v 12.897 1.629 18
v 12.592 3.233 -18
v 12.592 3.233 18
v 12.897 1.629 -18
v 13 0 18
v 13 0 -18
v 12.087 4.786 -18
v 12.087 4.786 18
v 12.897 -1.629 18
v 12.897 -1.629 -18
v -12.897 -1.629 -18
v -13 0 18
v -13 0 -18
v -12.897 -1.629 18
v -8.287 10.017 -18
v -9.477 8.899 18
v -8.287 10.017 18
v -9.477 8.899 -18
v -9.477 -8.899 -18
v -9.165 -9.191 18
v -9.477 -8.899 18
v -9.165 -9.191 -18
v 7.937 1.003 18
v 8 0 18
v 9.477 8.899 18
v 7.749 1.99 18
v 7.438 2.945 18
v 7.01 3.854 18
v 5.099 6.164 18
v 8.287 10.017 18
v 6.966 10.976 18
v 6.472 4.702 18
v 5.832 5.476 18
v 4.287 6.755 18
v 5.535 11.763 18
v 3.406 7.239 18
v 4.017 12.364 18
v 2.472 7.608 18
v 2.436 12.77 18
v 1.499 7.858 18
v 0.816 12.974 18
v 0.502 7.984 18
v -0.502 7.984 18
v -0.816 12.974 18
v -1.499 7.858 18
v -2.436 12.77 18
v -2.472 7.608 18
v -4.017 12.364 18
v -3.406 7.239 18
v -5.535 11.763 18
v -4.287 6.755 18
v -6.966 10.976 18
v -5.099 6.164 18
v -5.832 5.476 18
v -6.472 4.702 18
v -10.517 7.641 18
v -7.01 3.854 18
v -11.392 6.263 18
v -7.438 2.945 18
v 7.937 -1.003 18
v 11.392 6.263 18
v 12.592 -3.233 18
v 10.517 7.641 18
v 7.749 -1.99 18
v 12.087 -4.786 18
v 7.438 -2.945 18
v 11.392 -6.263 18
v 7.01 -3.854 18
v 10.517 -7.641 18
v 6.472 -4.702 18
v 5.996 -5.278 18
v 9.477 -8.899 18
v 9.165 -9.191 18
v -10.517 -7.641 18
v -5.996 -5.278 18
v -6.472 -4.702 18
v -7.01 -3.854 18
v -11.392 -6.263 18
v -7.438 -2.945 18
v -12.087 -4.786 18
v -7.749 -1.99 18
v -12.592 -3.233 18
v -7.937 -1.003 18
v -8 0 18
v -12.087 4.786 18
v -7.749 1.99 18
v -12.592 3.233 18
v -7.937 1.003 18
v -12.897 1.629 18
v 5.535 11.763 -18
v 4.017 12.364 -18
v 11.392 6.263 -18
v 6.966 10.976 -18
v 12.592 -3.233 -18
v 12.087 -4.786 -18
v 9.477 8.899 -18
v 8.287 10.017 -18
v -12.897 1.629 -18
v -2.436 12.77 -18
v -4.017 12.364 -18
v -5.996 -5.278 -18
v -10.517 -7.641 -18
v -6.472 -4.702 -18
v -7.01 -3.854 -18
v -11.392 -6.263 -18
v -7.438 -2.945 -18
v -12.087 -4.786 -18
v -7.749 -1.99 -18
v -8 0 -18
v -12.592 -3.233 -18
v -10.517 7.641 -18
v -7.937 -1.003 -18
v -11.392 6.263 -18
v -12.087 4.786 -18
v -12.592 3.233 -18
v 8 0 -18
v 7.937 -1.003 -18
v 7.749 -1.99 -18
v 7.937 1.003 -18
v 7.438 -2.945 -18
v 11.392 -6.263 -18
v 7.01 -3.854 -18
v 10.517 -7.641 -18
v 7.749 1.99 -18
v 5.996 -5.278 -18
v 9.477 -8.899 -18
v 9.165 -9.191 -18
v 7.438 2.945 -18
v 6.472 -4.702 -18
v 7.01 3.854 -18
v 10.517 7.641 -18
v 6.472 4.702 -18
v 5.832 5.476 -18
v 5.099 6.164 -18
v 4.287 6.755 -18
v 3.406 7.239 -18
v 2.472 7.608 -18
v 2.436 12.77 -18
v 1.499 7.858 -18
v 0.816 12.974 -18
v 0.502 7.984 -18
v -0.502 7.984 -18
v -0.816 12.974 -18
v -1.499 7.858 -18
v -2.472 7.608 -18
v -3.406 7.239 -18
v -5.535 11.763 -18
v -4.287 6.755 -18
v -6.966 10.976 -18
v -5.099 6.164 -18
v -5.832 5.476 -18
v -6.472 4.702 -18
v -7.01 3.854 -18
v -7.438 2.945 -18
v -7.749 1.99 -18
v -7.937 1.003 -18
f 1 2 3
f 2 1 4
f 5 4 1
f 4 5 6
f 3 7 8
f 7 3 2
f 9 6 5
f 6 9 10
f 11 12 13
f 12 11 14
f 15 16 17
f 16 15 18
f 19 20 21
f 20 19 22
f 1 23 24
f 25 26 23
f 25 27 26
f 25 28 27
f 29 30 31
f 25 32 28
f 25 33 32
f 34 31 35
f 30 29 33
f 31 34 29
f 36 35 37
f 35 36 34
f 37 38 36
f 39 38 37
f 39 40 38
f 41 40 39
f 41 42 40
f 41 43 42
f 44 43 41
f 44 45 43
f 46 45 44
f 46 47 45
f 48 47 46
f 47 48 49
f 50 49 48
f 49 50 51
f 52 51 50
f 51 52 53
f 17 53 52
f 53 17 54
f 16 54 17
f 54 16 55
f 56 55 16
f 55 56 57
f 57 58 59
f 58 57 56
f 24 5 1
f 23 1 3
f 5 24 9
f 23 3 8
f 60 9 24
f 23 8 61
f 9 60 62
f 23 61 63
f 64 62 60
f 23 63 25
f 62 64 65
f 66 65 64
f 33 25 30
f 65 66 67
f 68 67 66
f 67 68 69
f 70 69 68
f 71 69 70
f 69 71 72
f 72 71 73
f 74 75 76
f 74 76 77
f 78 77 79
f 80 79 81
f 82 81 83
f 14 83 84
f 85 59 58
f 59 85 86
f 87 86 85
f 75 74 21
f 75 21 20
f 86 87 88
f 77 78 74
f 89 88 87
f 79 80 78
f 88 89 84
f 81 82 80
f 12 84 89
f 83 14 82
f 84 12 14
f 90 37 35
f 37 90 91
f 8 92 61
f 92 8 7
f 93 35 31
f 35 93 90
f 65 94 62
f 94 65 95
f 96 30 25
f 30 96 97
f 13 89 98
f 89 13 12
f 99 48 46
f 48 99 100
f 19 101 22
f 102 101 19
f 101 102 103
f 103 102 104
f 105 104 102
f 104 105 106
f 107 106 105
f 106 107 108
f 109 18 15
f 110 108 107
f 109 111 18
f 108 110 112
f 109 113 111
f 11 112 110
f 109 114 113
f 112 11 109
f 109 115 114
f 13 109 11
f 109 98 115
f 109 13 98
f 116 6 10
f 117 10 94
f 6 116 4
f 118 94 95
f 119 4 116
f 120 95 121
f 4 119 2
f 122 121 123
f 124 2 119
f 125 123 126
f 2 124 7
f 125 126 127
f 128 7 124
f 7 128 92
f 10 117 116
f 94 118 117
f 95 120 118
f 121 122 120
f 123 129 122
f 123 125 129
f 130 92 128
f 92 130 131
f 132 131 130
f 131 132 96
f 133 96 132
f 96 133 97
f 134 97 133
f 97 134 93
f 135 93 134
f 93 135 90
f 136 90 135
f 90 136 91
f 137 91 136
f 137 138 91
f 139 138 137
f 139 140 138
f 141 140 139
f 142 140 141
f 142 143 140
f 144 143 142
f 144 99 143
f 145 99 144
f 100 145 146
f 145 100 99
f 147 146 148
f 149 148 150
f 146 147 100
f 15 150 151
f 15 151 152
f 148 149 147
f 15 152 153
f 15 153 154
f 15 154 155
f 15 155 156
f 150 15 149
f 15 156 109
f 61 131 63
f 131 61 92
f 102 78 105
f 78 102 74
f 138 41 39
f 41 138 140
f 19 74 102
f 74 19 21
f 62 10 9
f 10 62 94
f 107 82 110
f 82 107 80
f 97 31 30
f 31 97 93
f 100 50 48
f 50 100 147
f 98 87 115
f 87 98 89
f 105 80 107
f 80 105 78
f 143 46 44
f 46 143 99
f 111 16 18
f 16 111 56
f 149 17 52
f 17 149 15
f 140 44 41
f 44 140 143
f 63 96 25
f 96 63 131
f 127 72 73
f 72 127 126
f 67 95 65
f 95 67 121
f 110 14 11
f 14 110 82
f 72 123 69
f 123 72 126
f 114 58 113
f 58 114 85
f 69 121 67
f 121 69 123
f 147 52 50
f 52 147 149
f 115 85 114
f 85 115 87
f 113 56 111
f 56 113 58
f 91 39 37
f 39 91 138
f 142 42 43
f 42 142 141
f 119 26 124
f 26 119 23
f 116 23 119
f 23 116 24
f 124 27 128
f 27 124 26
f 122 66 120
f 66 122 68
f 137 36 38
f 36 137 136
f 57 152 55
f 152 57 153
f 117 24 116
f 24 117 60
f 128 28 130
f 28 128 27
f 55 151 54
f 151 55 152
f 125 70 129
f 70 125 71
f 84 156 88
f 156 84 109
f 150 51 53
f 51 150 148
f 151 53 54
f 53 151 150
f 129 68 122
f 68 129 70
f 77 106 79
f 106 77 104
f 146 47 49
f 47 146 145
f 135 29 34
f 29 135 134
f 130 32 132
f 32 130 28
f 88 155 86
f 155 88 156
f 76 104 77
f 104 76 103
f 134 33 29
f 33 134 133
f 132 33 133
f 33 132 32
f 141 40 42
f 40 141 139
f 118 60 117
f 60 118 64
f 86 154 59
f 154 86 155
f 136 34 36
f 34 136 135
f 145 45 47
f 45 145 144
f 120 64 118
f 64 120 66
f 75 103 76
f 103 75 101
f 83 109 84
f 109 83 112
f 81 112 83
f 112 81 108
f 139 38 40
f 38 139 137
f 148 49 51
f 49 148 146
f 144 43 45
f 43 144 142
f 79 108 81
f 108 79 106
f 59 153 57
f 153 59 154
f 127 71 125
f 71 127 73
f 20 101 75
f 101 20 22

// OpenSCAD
/*
 * Model of a LMBXXUUOP linear bearing
 * 
 * 
 * This object is for display only. it is not printable
 * 
 * currently only has info to produce LM8UU bearings
 */
use <MCAD/libtriangles.scad>

$fn=50;

LM8UUOP =  [8,  15, 24, 17.5, 14.3, 1.1, 1, 6.8, 80]; // opening angle+gap info is from LM10UUOP
LM12UUOP = [12, 22, 32, 22.9, 21,   1.3, 1, 8, 78];
LM16UUOP = [16, 26, 36, 24.9, 24.9, 1.3, 1, 10.8, 78];

function LM8OP_length() = LM8UUOP[2];
function LM8OP_dia() = LM8UUOP[1];

function LM12OP_length() = LM12UUOP[2];
function LM12OP_dia() = LM12UUOP[1];

function LM16OP_length() = LM16UUOP[2];
function LM16OP_dia() = LM16UUOP[1];

module LMOP(size)
{
	echo(str("Item: LM",size,"OPUU bushing"));
	if (size == 8)
	{
		_LM__UUOP(LM8UUOP[0], LM8UUOP[1], LM8UUOP[2], LM8UUOP[3], LM8UUOP[4], LM8UUOP[5], LM8UUOP[6], LM8UUOP[7], LM8UUOP[8]);
	}
	if (size == 12)
	{
		_LM__UUOP(LM12UUOP[0], LM12UUOP[1], LM12UUOP[2], LM12UUOP[3], LM12UUOP[4], LM12UUOP[5], LM12UUOP[6], LM12UUOP[7], LM12UUOP[8]);
	}
	if (size == 16)
	{
		_LM__UUOP(LM16UUOP[0], LM16UUOP[1], LM16UUOP[2], LM16UUOP[3], LM16UUOP[4], LM16UUOP[5], LM16UUOP[6], LM16UUOP[7], LM16UUOP[8]);
	}
}

module LMOP_oversize(size)
{
	//match bearing based on bearing outer dia
	if (size == 15) //then is an LM8
	{
		_LM__UUOP(LM8UUOP[0], LM8UUOP[1], LM8UUOP[2], LM8UUOP[3], LM8UUOP[4], LM8UUOP[5], LM8UUOP[6], LM8UUOP[7]-1, LM8UUOP[8]-20);
	}
}

module _LM__UUOP(dr, D, L, B, D1, W, F, E, angle)
{
	// side length of isosceles triangle is 30
	// use lots of trig - use half the isos tri (gives us a anice right angle triangle to work with)
	xlen = ( sin(angle/2) / (sin(90)/30) )*2;
	ylen = L;
	zlen = sin(180-(90+(angle/2))) / ( sin(90)/30 );
	
	difference()
	{
		//the bearing
		color("Silver") cylinder(d=D, h=L, center=true);
		cylinder(d=dr, h=L+1, center=true);
		
		//the gap in the bearing
		translate([0,-9.6,0])
		{
			union()
			{
				//the triangluar slot
				translate([-xlen/2,-zlen/2+0.07,ylen/2+0.1])
					rotate([-90,0,0])
						eqlprism(xlen, ylen+1, zlen);
				//the gap in the centre
				*translate([0,E+2,0.1])
					cube(size=[E,E/2,L], center=true);
			}
		}
	}
}

//uncomment to display
LMOP(16);
//LMOP_oversize(15);
